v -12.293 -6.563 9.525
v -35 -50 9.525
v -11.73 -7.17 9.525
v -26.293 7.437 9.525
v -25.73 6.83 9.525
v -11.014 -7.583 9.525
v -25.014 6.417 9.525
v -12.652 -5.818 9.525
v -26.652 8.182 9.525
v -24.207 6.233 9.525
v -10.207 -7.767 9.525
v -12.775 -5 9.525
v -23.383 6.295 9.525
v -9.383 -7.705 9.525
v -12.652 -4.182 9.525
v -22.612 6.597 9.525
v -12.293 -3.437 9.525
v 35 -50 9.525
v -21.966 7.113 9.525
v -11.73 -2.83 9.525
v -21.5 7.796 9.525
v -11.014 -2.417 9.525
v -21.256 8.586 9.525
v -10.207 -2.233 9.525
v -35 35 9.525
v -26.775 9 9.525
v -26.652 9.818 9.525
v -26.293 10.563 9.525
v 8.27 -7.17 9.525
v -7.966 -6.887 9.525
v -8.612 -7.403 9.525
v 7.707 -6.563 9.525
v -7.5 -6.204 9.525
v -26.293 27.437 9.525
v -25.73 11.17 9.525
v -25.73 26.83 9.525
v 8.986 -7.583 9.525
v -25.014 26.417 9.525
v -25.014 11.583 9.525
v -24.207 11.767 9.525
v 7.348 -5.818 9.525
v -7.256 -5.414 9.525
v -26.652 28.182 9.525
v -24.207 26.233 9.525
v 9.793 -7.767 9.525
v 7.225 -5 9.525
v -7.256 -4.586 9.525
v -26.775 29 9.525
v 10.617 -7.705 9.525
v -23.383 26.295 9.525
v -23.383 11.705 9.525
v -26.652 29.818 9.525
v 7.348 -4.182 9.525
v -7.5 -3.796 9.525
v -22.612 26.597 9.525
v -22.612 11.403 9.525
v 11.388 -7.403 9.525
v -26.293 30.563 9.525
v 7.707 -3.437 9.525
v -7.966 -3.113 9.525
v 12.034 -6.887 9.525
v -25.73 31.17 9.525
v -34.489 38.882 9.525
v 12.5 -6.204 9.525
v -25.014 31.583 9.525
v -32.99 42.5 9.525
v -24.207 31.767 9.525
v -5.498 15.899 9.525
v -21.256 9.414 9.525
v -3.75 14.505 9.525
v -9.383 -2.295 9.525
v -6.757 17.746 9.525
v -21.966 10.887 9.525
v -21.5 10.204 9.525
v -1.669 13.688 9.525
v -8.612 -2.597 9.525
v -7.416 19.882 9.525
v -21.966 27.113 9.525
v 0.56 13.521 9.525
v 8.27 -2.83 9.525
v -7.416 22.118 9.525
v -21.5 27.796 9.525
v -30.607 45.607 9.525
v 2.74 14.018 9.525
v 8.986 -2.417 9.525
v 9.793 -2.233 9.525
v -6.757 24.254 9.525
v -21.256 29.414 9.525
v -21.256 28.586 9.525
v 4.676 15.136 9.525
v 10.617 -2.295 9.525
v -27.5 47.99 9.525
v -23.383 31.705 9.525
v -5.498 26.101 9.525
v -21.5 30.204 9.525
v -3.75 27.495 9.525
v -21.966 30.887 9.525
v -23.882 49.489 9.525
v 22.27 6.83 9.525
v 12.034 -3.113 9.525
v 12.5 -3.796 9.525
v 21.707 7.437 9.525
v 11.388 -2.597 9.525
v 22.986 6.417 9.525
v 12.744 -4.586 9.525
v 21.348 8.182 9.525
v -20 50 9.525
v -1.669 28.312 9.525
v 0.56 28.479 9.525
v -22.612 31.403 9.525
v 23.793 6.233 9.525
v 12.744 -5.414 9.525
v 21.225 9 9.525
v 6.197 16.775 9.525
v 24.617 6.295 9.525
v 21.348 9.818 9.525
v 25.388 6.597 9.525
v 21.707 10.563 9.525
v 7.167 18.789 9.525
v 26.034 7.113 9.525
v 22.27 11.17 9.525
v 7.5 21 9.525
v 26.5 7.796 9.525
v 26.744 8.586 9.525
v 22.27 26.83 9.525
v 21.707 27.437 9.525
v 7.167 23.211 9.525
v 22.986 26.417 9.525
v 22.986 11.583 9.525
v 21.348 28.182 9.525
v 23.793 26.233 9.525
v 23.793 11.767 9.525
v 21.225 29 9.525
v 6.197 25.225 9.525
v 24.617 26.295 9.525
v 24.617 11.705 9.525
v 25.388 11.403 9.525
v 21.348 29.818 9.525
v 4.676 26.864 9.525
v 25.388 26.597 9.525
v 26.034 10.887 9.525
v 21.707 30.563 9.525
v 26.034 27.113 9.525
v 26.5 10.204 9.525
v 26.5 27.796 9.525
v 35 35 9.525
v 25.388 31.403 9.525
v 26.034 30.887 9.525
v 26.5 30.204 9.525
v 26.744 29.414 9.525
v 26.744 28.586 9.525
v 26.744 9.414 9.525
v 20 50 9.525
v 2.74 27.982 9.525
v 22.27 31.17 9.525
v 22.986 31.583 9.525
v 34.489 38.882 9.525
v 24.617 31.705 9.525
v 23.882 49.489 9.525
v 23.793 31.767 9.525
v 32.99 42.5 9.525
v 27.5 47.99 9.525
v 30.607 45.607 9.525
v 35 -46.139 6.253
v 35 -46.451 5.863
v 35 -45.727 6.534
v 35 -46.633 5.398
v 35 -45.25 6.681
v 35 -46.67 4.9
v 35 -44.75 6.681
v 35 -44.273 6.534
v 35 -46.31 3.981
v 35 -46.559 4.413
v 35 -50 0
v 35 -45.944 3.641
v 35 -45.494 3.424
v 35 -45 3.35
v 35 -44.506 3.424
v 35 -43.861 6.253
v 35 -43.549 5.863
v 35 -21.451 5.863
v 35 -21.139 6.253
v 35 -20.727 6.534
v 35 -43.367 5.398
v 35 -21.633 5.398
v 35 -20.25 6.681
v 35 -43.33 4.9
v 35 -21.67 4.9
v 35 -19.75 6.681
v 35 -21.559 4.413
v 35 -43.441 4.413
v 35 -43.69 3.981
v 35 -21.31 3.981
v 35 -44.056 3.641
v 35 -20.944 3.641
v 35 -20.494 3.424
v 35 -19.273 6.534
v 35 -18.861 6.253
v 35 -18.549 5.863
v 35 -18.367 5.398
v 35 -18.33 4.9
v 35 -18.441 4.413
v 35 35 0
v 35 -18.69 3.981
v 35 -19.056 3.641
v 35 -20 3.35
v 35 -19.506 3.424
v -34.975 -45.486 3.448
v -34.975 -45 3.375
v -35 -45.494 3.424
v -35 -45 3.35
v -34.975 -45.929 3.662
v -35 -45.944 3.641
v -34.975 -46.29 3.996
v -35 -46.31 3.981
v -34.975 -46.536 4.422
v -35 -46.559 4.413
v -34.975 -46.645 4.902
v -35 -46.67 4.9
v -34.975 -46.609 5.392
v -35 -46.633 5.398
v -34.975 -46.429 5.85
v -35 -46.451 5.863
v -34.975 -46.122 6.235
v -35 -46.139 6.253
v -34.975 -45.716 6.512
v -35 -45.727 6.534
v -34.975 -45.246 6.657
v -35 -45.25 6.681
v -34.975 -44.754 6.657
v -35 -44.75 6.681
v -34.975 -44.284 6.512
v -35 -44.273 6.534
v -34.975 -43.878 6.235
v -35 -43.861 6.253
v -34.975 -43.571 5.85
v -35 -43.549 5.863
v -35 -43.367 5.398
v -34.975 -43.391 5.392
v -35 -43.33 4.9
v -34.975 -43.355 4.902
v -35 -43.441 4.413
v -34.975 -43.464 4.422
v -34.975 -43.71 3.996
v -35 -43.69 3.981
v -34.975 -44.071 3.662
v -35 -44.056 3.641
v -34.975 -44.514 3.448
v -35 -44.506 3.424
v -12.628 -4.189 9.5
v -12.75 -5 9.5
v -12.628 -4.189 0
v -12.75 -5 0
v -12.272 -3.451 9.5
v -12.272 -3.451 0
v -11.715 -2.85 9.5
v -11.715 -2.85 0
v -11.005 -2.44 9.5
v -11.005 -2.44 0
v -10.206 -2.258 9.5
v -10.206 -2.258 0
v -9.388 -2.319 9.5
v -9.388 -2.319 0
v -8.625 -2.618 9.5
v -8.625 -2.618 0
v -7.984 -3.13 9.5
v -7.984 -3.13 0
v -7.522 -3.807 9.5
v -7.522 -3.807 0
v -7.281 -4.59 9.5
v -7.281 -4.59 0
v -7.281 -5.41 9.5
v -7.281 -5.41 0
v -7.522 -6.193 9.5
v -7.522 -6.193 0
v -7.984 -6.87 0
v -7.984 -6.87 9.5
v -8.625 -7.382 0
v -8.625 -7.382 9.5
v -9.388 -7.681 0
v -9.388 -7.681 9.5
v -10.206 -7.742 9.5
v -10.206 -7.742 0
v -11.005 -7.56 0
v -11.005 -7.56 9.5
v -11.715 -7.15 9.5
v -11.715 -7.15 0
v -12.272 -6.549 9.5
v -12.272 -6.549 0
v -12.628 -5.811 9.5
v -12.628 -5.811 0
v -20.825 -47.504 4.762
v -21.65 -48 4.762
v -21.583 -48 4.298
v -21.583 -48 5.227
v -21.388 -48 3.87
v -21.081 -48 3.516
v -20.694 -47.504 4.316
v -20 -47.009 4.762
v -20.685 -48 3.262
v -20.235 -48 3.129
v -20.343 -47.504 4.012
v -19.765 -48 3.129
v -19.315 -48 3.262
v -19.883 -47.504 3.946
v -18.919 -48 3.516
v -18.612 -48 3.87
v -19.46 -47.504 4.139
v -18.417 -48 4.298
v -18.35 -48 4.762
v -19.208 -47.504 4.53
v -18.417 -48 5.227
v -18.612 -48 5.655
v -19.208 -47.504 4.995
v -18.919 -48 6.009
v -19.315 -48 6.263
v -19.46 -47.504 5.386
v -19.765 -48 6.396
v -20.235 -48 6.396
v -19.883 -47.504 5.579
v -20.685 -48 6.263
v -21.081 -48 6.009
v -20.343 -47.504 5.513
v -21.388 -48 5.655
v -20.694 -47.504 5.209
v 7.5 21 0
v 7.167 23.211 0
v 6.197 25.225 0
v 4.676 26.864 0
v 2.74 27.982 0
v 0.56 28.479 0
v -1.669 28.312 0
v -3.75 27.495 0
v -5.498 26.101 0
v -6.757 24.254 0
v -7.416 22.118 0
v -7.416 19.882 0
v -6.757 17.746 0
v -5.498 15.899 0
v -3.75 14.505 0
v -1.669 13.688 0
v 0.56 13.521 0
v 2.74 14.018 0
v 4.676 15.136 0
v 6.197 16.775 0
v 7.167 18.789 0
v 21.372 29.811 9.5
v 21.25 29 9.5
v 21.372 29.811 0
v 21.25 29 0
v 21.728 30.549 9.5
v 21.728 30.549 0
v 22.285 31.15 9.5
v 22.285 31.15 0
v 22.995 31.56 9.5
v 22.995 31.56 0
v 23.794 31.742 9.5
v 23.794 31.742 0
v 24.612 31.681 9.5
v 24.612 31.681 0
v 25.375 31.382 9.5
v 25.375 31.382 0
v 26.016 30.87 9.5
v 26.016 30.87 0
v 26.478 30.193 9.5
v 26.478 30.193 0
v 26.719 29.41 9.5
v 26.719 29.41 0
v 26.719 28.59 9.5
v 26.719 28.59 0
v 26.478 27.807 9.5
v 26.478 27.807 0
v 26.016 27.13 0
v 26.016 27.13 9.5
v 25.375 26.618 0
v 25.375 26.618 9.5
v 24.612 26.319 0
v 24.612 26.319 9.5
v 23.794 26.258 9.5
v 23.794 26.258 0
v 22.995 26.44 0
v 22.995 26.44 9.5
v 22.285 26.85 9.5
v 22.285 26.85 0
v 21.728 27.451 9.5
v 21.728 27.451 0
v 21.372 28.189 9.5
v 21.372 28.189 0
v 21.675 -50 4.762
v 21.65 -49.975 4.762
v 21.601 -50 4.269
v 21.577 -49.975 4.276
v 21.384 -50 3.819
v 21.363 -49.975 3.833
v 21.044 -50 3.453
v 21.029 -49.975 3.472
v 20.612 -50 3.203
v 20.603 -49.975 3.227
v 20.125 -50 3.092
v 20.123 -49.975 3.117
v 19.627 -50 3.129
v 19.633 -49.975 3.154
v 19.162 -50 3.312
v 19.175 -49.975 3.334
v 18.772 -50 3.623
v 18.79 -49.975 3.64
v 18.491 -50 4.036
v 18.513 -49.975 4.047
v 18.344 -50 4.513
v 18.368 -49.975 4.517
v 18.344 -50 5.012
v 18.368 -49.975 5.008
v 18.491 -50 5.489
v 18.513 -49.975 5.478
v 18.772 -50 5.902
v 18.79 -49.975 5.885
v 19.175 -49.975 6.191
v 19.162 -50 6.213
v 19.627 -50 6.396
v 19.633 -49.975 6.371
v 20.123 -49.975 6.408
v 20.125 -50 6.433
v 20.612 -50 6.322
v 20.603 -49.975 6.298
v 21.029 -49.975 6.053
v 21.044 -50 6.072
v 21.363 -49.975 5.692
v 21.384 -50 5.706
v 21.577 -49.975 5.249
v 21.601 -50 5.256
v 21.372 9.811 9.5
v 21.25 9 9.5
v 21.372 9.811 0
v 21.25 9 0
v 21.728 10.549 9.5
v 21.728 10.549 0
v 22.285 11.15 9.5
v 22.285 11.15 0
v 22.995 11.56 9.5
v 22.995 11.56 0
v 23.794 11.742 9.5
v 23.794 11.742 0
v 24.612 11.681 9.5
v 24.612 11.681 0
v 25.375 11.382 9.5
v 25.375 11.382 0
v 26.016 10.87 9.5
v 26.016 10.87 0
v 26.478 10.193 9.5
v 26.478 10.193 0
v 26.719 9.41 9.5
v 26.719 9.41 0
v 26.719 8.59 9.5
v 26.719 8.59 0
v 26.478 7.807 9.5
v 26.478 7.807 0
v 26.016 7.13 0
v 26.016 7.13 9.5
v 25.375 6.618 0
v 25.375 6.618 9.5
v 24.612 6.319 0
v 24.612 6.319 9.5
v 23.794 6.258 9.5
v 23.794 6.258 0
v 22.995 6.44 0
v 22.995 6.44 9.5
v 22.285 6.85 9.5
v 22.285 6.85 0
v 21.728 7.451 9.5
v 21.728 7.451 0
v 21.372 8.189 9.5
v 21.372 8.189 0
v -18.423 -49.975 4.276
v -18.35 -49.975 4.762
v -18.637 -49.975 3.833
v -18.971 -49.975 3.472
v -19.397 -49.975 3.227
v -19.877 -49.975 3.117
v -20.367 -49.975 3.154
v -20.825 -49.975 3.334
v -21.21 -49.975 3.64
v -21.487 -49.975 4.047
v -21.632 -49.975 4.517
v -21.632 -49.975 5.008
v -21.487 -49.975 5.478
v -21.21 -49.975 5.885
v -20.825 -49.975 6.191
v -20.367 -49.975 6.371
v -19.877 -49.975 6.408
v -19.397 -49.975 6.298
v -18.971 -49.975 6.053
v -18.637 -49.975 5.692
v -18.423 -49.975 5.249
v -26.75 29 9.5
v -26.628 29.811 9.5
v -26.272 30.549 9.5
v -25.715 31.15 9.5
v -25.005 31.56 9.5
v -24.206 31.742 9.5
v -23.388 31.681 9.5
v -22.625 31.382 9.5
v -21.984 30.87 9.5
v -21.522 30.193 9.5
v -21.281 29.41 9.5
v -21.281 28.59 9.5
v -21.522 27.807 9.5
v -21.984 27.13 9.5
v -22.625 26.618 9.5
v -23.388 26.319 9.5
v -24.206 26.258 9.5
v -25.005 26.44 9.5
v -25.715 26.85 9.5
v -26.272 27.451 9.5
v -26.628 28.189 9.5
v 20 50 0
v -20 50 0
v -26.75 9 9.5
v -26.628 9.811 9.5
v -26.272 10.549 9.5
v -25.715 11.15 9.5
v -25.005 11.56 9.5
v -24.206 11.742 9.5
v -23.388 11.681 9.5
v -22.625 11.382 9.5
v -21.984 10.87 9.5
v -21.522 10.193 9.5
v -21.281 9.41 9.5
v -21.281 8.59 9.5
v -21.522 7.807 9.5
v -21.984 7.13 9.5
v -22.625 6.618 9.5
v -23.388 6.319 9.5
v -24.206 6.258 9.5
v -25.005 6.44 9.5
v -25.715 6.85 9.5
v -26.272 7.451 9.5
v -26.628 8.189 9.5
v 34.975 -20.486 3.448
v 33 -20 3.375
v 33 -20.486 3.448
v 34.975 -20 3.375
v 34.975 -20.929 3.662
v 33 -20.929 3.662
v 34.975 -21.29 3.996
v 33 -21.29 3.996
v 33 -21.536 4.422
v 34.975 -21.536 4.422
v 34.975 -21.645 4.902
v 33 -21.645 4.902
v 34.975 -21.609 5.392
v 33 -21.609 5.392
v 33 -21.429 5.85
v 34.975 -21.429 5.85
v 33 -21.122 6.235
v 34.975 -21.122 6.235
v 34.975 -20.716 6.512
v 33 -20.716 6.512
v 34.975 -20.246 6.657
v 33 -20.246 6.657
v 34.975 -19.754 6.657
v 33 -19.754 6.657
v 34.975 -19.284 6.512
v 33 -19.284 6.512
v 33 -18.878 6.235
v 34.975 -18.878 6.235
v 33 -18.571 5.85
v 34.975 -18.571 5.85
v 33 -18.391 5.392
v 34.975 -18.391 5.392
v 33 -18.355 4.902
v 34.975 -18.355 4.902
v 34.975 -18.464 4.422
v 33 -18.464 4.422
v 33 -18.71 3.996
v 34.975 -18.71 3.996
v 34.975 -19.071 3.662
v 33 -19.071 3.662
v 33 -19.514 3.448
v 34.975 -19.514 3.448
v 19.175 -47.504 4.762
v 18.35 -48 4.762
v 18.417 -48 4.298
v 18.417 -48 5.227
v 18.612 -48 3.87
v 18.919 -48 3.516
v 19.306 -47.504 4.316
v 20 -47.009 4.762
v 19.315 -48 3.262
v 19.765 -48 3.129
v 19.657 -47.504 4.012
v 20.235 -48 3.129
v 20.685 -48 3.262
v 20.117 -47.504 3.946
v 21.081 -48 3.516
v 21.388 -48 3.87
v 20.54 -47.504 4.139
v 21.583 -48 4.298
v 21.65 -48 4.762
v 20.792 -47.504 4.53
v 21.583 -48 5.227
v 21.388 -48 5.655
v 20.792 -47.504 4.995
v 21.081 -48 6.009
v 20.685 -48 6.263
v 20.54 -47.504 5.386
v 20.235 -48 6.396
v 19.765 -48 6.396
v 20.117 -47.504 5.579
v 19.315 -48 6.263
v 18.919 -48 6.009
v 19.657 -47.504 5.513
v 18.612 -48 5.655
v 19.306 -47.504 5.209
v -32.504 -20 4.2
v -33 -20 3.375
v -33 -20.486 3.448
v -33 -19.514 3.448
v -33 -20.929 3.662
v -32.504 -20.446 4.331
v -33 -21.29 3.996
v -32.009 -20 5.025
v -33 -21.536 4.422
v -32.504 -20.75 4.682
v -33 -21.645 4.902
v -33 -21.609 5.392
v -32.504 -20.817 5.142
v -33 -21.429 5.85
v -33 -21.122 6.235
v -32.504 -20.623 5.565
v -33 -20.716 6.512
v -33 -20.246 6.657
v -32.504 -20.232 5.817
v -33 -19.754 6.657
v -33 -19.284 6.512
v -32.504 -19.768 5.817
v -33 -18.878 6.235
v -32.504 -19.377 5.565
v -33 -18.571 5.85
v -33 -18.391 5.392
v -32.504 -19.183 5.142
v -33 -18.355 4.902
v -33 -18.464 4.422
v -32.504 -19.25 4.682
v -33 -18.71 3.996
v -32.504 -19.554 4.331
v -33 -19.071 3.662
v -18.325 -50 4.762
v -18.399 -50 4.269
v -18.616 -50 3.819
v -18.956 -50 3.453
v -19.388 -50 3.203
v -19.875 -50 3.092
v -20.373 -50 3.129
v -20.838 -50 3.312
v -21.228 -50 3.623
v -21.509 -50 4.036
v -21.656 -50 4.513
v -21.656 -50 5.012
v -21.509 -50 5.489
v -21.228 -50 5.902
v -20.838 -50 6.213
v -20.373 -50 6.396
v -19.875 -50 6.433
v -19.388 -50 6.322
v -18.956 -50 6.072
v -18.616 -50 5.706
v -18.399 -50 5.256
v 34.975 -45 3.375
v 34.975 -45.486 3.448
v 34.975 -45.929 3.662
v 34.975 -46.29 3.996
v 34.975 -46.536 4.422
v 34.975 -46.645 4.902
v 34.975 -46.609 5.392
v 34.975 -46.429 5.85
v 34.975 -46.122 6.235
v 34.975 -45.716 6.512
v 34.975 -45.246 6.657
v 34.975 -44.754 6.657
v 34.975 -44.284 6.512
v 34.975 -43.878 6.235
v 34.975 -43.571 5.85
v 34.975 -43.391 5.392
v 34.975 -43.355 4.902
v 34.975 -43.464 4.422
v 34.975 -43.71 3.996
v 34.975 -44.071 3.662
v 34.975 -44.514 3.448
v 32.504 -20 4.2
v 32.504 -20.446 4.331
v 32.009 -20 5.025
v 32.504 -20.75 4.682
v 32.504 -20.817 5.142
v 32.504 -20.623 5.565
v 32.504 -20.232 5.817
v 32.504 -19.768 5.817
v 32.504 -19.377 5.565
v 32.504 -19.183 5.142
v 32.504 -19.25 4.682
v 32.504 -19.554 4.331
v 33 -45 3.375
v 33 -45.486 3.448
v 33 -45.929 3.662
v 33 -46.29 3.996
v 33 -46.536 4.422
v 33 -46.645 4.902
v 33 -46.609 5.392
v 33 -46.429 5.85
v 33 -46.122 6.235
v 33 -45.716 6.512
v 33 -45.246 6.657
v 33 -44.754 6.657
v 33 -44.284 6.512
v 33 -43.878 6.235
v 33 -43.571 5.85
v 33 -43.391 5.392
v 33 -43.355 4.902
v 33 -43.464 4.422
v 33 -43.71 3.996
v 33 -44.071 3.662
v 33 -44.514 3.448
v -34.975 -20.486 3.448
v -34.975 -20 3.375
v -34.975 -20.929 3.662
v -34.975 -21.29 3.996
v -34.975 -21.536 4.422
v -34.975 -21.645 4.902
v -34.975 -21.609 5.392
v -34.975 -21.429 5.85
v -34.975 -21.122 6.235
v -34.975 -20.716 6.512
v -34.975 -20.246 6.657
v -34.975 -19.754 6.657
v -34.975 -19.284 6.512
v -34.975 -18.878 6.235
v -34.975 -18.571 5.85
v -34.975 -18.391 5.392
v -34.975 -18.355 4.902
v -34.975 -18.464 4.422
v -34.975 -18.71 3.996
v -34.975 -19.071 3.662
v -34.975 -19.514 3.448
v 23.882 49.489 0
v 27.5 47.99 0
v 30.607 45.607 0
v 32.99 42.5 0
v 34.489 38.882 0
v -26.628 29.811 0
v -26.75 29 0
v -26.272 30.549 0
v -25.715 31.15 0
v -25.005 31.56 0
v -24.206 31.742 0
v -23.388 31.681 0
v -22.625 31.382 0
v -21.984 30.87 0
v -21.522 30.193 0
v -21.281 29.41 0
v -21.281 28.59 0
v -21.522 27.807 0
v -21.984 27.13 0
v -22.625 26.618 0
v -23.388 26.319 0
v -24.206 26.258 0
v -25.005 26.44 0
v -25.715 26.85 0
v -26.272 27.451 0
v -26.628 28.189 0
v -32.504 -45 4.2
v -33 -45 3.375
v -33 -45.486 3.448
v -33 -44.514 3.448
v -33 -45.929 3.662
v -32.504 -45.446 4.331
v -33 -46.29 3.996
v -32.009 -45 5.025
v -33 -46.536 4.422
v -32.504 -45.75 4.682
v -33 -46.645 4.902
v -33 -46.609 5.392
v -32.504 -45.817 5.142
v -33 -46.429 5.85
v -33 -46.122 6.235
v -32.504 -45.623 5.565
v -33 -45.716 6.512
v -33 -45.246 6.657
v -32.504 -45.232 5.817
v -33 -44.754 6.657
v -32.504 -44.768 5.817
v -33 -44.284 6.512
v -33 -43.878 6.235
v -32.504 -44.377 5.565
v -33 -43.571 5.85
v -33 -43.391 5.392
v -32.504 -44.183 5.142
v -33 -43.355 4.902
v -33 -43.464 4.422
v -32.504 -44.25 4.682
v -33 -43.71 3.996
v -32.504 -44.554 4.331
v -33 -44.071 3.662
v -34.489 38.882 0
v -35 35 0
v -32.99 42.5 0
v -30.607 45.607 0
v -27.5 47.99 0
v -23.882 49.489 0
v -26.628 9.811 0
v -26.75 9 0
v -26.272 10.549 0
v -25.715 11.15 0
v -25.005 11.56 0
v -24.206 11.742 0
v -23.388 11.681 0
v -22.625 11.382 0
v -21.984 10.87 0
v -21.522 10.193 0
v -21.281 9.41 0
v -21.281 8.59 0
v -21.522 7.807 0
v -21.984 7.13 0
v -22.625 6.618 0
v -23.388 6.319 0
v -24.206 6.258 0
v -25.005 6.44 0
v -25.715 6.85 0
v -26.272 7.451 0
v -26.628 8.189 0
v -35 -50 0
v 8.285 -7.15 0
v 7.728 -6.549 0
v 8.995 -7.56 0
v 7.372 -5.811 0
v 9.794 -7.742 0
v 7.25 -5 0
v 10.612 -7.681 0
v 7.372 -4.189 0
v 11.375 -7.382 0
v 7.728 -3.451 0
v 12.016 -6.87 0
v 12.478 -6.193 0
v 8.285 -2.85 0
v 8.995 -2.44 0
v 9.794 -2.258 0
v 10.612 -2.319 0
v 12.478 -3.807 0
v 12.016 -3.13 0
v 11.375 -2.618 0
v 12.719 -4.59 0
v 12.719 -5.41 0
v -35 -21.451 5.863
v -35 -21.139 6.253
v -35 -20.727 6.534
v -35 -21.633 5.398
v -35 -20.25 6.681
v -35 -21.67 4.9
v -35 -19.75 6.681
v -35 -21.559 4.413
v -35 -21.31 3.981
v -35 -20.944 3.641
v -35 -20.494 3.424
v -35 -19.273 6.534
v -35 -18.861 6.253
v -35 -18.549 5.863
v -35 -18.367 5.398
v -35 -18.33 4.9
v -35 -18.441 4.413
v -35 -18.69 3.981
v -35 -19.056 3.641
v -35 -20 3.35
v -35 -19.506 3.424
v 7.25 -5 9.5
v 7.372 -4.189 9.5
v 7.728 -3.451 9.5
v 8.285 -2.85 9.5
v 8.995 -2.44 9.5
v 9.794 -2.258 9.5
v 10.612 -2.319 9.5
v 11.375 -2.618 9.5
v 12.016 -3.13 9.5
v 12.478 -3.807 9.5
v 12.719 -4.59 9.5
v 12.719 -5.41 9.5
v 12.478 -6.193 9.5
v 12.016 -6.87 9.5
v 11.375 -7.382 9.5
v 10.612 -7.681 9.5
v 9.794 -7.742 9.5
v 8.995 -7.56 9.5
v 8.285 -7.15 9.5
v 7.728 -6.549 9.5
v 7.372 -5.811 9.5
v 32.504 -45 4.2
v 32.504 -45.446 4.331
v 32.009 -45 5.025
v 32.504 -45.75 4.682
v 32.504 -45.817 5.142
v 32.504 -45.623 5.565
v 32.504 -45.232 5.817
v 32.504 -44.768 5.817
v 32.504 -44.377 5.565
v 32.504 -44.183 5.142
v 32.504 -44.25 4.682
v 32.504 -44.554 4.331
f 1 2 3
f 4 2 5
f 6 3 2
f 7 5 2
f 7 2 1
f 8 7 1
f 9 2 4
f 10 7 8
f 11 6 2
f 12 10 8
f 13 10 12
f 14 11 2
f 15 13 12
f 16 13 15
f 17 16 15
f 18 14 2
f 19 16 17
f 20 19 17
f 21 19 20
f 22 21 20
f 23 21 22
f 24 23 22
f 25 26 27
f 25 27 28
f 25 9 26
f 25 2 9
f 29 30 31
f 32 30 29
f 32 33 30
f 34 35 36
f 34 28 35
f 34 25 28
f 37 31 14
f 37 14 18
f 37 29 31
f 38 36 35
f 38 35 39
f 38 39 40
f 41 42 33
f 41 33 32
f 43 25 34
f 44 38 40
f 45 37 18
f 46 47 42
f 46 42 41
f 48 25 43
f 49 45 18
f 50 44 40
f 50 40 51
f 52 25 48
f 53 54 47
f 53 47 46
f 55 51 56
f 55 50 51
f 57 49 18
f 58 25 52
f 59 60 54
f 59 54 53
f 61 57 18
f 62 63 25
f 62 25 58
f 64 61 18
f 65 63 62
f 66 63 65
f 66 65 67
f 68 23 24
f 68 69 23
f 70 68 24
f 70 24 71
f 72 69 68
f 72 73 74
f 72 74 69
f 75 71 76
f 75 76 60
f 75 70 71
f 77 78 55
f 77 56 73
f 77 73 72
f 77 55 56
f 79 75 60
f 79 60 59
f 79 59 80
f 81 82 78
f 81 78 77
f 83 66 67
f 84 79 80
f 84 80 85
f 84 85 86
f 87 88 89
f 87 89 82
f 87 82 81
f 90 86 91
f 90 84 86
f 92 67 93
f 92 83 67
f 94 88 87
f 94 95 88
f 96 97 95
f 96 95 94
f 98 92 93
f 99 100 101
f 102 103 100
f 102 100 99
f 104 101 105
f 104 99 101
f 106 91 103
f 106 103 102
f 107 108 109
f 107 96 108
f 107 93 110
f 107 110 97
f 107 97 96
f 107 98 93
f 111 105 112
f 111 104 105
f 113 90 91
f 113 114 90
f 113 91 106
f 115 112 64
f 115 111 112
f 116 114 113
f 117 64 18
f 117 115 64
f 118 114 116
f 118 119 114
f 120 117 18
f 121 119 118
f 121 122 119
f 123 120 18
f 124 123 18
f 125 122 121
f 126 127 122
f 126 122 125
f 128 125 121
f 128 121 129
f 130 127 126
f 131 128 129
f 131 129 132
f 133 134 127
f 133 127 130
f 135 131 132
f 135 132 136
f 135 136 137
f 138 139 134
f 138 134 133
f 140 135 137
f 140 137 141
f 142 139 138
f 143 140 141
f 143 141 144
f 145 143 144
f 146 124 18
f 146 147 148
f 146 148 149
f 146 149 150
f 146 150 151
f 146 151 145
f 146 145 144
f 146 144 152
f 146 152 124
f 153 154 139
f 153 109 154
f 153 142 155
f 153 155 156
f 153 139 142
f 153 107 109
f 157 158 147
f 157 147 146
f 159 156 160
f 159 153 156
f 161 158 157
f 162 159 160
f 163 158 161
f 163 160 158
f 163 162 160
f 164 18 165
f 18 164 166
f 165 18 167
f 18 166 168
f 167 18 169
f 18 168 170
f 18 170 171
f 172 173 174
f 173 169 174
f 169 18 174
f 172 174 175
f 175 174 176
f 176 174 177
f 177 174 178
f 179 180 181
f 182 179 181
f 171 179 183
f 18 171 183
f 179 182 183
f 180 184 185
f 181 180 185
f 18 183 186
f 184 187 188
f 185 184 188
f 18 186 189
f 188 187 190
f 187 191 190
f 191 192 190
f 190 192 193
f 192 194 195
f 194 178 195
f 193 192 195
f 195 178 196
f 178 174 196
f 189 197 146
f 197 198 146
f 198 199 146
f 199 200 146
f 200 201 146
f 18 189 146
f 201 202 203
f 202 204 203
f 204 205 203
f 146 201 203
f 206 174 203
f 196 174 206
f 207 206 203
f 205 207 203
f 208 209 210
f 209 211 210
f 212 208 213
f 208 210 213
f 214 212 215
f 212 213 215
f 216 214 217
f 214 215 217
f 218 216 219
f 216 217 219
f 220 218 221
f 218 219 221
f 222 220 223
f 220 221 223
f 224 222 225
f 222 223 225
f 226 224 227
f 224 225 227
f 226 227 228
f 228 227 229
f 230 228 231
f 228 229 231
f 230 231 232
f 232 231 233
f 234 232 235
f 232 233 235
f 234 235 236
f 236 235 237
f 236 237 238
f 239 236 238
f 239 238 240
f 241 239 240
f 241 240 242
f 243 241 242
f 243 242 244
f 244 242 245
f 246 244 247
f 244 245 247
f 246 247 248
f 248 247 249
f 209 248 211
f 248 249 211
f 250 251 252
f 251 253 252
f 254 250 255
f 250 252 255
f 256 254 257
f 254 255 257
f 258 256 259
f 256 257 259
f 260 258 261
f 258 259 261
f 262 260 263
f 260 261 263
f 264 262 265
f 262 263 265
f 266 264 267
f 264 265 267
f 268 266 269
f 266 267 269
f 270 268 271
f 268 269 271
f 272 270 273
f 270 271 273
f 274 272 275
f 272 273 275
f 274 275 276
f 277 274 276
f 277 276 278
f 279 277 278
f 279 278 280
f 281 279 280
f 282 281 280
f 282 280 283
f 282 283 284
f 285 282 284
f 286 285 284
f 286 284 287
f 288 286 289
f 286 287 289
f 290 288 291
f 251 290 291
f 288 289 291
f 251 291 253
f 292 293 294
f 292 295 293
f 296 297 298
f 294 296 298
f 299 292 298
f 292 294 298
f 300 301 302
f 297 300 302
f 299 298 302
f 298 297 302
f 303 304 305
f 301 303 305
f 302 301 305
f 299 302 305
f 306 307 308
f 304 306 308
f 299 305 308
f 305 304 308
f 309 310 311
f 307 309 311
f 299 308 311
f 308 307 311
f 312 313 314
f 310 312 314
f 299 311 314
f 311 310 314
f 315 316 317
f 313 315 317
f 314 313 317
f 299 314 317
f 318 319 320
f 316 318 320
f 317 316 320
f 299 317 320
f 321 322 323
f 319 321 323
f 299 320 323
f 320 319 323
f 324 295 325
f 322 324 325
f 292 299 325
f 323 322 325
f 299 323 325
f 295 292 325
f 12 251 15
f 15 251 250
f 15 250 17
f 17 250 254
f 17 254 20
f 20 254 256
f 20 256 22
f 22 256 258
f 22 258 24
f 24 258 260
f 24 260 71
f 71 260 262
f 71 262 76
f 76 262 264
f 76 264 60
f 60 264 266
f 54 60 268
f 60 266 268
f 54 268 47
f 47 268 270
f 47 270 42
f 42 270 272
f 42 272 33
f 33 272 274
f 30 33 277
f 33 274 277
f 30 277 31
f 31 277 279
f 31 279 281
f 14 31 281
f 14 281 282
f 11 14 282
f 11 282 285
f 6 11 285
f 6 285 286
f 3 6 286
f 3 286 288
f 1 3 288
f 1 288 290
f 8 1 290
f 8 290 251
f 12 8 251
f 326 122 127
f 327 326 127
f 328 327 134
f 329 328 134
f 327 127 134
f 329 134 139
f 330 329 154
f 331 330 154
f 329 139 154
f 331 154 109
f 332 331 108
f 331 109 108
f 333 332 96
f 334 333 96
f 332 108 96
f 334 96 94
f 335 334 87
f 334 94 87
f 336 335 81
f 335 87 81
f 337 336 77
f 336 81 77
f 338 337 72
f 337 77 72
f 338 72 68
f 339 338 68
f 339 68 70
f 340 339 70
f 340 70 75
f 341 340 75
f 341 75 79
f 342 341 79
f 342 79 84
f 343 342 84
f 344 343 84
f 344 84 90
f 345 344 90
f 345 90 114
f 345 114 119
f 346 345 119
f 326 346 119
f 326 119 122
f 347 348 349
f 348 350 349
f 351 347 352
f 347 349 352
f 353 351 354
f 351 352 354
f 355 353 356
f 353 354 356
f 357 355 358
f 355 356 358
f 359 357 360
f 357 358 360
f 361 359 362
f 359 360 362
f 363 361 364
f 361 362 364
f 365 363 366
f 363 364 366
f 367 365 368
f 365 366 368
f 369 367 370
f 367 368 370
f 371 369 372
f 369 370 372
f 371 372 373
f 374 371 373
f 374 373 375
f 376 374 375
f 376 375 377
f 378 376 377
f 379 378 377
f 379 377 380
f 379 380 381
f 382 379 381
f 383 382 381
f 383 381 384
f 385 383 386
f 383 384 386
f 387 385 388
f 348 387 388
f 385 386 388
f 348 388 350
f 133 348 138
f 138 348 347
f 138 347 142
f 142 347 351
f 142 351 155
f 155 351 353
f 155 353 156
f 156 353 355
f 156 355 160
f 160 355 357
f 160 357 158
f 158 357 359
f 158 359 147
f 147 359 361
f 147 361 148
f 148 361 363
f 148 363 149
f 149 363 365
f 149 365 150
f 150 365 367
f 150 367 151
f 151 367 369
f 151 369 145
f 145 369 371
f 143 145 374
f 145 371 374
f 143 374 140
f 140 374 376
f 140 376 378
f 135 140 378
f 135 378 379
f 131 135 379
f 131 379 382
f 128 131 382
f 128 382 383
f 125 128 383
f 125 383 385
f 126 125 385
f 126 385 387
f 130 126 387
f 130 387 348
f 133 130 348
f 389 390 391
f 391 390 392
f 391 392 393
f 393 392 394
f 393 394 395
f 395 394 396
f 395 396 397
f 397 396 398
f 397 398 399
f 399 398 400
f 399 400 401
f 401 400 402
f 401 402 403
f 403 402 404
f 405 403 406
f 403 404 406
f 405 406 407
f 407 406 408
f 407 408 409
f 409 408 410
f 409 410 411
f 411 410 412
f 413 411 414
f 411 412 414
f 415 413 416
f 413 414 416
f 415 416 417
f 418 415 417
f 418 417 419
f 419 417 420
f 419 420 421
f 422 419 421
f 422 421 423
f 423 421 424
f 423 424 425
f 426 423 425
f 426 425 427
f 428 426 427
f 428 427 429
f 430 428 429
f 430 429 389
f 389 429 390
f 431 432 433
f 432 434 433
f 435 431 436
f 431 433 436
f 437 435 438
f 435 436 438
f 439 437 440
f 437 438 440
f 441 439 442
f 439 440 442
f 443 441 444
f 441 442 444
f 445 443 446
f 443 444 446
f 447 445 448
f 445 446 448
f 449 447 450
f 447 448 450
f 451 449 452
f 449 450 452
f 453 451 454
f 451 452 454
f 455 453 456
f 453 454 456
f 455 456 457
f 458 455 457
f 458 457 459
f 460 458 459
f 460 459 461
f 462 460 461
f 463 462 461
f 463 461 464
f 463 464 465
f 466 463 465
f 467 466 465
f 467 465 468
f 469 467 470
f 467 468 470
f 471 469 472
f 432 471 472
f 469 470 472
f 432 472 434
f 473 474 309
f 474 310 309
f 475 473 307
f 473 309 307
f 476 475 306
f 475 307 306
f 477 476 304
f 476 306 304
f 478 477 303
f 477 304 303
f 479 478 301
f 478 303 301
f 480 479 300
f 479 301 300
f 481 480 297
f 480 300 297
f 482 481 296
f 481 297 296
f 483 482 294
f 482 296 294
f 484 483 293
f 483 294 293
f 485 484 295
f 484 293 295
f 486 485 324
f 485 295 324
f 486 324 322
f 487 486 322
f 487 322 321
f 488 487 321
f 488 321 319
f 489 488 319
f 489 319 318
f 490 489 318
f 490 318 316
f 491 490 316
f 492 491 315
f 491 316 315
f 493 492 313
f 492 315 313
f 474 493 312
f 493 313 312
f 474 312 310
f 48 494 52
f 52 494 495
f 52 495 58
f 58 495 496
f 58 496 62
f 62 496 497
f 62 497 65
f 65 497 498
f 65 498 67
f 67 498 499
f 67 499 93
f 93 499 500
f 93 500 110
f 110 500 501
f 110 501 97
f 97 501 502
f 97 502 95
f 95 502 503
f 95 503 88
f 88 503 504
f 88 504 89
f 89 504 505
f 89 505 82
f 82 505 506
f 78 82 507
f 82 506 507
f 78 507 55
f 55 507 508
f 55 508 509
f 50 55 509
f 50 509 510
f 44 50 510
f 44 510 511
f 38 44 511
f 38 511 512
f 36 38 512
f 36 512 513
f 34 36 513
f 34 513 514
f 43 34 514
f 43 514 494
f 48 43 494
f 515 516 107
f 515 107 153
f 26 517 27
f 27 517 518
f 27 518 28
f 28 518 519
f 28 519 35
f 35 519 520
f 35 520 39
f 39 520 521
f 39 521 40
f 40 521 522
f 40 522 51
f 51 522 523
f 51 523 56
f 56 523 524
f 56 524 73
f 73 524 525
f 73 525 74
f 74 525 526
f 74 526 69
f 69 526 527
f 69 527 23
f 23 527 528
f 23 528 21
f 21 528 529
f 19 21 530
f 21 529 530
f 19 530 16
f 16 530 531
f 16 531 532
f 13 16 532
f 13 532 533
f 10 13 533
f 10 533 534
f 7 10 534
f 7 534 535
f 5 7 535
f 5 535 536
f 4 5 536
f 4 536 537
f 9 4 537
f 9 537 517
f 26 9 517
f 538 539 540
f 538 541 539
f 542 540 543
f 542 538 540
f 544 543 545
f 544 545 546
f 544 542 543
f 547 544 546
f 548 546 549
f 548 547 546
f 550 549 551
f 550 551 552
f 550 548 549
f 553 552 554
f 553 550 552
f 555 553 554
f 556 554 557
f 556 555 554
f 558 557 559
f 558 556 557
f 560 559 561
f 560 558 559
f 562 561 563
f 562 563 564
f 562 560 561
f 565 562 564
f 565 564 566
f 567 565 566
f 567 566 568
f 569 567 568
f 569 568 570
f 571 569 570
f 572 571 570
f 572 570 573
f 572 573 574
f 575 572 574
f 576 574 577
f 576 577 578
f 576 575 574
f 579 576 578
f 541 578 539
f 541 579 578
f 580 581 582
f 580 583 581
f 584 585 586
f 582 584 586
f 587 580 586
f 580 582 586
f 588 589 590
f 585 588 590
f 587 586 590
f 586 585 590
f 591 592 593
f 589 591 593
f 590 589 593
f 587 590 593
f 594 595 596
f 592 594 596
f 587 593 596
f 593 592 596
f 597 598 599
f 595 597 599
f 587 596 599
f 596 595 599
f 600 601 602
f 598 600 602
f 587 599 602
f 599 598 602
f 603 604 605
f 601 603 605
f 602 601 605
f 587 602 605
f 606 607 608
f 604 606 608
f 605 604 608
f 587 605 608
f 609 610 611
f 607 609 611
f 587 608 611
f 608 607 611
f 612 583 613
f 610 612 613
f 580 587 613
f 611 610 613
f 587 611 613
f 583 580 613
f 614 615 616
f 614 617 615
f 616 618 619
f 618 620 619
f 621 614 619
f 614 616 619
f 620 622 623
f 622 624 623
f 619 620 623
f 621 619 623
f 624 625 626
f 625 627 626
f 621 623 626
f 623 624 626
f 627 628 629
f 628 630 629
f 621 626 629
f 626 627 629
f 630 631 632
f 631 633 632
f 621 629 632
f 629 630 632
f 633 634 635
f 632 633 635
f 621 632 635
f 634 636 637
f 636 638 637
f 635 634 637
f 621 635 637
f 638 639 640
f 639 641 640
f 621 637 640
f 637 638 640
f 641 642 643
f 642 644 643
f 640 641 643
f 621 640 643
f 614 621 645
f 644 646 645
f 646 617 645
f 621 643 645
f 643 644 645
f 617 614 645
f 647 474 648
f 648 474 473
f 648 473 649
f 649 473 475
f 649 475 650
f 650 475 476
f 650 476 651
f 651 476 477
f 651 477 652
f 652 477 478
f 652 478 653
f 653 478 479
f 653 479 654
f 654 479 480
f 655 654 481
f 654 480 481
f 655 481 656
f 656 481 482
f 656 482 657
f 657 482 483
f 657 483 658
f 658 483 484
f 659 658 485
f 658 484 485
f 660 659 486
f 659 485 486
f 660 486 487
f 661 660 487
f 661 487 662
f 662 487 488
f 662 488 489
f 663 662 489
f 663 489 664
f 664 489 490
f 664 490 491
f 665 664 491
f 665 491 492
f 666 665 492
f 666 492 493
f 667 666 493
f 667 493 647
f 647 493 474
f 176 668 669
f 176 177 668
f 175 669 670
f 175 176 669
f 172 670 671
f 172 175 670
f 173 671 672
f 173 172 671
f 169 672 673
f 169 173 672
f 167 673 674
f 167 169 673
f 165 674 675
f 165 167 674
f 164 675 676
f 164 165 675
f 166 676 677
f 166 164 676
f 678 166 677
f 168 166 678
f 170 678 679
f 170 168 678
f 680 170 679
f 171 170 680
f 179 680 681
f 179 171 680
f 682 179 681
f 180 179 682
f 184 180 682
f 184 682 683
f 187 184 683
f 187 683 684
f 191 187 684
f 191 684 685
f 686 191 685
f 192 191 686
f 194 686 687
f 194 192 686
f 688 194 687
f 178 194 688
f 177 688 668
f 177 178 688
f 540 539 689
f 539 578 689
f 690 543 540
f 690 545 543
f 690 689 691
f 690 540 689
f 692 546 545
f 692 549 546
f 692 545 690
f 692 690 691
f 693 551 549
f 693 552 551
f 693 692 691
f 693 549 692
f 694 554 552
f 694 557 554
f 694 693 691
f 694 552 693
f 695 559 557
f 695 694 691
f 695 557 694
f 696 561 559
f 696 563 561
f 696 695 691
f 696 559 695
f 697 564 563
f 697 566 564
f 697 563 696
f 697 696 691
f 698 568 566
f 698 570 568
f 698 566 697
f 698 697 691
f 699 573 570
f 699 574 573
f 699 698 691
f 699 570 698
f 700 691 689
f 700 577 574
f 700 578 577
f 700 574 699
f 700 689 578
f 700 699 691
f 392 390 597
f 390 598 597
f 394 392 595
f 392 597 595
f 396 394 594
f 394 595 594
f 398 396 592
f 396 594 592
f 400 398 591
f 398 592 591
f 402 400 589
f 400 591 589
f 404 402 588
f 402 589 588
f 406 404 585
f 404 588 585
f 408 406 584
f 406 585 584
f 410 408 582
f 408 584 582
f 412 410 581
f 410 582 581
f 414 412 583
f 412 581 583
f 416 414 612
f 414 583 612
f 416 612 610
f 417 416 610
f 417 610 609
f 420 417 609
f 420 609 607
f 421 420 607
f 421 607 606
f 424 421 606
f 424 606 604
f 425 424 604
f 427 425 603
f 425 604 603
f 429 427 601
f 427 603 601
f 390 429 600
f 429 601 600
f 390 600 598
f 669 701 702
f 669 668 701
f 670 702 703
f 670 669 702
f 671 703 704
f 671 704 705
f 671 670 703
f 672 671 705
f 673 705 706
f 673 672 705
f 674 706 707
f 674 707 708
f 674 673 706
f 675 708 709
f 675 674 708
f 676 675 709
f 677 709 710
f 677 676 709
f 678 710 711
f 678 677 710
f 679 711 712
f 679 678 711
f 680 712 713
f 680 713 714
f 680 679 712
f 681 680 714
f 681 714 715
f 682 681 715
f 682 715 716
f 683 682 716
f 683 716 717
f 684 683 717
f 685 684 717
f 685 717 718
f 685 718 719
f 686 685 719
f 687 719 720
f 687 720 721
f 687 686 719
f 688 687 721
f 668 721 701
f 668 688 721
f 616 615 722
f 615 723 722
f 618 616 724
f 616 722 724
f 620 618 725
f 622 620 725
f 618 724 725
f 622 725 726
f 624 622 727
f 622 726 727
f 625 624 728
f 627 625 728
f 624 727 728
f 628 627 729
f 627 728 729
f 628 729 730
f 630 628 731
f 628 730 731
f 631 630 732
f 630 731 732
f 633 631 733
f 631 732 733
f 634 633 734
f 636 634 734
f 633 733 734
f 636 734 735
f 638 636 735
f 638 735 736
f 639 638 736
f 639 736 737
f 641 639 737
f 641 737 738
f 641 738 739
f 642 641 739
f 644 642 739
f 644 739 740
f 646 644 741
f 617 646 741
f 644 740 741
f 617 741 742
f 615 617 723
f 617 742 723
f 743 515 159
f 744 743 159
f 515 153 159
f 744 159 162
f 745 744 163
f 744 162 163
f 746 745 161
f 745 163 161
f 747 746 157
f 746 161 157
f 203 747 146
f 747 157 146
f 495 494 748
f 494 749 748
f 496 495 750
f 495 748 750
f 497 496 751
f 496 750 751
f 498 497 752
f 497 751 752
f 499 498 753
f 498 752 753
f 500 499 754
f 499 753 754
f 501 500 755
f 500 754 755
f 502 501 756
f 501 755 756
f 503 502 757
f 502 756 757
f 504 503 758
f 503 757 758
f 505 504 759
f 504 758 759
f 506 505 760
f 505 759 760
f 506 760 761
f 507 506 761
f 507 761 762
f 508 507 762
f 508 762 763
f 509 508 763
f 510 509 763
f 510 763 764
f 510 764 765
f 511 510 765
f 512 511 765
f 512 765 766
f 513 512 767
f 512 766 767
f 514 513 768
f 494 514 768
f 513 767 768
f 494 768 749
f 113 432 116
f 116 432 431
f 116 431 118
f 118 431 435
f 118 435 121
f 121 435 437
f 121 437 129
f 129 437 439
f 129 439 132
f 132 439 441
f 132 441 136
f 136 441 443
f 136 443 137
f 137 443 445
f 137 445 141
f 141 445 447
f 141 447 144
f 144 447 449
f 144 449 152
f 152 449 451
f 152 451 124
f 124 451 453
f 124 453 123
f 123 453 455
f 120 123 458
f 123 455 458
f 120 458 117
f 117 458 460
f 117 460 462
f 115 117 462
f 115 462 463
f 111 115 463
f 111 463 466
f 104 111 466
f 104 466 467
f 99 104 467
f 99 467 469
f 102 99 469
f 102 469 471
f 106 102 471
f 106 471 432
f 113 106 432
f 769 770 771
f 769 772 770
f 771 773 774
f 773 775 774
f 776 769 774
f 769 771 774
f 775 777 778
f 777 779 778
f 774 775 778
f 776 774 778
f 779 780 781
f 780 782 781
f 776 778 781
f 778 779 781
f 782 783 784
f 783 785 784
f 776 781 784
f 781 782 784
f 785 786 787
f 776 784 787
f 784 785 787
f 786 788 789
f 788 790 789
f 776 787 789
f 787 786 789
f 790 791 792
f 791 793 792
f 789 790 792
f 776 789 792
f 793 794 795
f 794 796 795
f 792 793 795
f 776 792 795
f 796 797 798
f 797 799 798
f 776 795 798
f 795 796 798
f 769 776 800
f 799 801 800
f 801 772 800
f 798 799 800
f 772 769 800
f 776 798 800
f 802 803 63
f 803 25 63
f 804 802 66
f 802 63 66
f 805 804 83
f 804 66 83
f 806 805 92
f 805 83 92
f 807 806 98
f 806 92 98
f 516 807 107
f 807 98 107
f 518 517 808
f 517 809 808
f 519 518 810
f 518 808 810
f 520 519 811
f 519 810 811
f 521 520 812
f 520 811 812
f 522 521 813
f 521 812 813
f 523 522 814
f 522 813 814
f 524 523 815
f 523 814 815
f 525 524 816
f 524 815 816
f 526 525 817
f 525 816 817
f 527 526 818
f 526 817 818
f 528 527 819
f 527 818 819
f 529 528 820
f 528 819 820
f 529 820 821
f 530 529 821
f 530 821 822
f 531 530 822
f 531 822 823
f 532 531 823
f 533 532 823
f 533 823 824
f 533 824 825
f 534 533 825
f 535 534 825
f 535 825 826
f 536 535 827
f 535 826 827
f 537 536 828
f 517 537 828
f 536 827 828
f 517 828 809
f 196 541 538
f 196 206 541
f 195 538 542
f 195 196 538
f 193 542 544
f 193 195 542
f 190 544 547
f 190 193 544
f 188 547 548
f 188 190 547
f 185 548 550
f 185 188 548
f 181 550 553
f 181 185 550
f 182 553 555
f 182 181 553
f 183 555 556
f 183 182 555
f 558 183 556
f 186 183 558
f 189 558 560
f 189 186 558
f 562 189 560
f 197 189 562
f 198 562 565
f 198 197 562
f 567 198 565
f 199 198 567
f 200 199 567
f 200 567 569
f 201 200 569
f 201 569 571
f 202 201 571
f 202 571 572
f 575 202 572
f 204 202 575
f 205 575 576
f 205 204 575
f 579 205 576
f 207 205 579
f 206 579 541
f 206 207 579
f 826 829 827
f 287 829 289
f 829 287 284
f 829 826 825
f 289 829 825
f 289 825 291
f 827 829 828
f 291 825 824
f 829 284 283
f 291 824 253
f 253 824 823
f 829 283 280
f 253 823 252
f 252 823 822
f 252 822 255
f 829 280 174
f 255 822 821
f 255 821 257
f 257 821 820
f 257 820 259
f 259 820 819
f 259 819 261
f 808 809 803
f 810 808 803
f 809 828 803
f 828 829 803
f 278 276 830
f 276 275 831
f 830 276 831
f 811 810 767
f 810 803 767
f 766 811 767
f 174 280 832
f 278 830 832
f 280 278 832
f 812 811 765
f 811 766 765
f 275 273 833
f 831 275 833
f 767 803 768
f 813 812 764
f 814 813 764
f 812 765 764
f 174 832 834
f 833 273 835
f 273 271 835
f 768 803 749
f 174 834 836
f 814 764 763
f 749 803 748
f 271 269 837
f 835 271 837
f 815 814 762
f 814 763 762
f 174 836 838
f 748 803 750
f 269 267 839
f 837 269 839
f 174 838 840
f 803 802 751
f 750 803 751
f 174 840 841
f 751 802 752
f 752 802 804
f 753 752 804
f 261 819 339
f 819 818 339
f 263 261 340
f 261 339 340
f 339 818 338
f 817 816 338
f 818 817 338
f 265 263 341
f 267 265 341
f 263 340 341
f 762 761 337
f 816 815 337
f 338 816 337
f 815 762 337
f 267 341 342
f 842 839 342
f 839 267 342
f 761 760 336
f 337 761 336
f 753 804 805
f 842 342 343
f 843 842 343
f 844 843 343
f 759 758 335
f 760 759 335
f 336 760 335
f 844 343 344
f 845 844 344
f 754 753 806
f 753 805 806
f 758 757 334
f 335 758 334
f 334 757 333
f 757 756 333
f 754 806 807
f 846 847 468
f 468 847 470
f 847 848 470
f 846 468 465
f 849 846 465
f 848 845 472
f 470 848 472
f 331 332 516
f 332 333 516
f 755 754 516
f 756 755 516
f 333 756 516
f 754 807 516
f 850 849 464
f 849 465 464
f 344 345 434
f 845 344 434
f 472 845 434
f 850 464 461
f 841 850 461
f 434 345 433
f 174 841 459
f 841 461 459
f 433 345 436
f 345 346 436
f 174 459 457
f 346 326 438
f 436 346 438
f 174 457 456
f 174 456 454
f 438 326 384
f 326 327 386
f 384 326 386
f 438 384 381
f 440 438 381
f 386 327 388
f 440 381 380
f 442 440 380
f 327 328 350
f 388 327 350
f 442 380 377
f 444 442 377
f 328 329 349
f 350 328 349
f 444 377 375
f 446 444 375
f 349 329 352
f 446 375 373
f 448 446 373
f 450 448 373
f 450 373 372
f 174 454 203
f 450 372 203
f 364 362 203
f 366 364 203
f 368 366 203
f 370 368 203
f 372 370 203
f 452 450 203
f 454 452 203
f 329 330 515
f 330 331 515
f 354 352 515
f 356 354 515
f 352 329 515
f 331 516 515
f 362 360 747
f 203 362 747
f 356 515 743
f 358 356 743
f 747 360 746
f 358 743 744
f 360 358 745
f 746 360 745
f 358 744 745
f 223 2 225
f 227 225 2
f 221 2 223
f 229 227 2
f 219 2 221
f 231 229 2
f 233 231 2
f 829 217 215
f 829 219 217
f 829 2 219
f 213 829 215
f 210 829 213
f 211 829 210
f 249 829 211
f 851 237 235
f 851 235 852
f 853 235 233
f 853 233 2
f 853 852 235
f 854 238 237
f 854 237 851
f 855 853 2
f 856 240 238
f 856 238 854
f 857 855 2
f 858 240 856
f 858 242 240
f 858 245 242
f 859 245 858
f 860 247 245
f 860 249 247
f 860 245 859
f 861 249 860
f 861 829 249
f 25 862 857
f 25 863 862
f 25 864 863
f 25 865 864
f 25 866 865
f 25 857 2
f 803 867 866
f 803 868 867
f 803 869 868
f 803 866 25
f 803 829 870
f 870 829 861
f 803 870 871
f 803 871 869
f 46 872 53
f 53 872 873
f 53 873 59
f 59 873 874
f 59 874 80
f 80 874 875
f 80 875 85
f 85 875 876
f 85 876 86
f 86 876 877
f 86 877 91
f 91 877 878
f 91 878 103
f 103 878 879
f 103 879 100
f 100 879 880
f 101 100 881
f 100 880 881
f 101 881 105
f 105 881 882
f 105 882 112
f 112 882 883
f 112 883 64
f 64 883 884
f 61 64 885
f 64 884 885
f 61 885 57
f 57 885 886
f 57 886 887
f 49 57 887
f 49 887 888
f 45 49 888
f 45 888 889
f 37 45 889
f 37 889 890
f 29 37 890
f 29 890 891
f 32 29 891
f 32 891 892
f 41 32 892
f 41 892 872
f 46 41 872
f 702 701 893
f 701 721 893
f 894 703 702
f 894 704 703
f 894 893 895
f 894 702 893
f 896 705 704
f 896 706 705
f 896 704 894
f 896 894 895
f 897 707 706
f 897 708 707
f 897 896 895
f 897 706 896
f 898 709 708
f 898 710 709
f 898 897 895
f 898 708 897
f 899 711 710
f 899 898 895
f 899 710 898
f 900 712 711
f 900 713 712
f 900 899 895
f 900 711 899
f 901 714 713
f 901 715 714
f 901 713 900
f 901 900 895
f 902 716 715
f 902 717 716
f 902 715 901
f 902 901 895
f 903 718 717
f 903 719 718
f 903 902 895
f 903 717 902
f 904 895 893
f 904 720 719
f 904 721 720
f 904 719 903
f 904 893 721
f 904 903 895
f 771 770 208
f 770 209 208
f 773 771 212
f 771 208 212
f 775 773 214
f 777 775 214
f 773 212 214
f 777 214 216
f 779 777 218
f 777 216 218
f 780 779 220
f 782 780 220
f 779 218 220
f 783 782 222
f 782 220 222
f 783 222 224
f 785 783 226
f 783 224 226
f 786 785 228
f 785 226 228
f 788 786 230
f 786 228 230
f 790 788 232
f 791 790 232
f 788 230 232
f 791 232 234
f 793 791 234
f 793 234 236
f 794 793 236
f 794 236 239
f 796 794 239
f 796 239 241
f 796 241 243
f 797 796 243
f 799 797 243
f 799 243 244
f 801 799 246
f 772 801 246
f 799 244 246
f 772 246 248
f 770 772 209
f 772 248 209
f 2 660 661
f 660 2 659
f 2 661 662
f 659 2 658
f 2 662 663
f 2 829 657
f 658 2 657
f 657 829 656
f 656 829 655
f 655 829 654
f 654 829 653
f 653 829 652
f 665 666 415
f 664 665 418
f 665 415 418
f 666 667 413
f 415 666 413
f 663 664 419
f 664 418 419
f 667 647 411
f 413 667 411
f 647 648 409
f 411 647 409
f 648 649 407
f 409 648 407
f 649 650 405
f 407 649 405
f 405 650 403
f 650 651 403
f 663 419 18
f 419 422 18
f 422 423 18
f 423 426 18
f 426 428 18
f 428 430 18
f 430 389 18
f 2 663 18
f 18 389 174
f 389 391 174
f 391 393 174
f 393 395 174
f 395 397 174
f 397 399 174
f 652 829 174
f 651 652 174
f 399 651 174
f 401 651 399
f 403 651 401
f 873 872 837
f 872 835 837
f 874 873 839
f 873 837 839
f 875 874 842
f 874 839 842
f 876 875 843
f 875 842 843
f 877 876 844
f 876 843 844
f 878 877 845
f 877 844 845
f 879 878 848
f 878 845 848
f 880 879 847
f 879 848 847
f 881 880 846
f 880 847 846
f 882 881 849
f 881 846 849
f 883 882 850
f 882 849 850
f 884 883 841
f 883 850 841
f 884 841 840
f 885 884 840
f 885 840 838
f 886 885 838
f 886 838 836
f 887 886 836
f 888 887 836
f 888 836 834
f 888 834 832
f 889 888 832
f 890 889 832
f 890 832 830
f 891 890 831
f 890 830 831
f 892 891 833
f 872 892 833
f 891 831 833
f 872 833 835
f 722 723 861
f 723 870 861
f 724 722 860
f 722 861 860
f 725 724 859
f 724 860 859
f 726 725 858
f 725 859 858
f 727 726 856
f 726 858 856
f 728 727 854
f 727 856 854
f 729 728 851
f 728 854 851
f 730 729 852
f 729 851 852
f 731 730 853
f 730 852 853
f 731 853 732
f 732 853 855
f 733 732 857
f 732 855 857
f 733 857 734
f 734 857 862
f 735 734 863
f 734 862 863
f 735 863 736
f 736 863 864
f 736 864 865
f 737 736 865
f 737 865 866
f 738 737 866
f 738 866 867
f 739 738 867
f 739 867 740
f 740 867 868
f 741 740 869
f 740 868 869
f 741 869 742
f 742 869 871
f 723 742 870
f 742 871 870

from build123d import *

# Parameters (mm, degrees)
SKETCH1_W                             = 70
SKETCH1_H                             = 100
BOSS_EXTRUDE1_DEPTH                   = 9.525
TAP_DRILL_FOR_M4X0_7_TAP1_D           = 3.3
TAP_DRILL_FOR_M4X0_7_TAP1_DEPTH       = 2
TAP_DRILL_FOR_M4X0_7_TAP1_CSINK_D     = 3.35
TAP_DRILL_FOR_M4X0_7_TAP1_CSINK_ANGLE = 90
TAP_DRILL_FOR_M4X0_7_TAP1_TIP         = 0.991420021
SKETCH6_R                             = 7.5
CUT_EXTRUDE1_DEPTH                    = 62.771560001
M5_CLEARANCE_HOLE1_D                  = 5.5
M5_CLEARANCE_HOLE1_CSINK_D            = 5.55
M5_CLEARANCE_HOLE1_CSINK_ANGLE        = 90
TAP_DRILL_FOR_M4X0_7_TAP2_AT_2_COUNT  = 2
TAP_DRILL_FOR_M4X0_7_TAP2_AT_2_PITCH  = 25
FILLET1_R                             = 15


with BuildPart() as part:
    # Sketch1 → Boss-Extrude1 (new body)
    with BuildSketch(Plane.XY):
        Rectangle(SKETCH1_W, SKETCH1_H)
    extrude(amount=BOSS_EXTRUDE1_DEPTH)

    # Tap Drill for M4x0.7 Tap1
    with Locations(Plane(origin=(0, -50, 0), x_dir=(-1, 0, 0), z_dir=(0, -1, 0))):
        with Locations((20, -4.7625), (-20, -4.7625)):
            CounterSinkHole(TAP_DRILL_FOR_M4X0_7_TAP1_D / 2, TAP_DRILL_FOR_M4X0_7_TAP1_CSINK_D / 2, depth=TAP_DRILL_FOR_M4X0_7_TAP1_DEPTH, counter_sink_angle=TAP_DRILL_FOR_M4X0_7_TAP1_CSINK_ANGLE)
            with Locations((0, 0, -(TAP_DRILL_FOR_M4X0_7_TAP1_DEPTH + TAP_DRILL_FOR_M4X0_7_TAP1_TIP / 2))):  # 118° drill point
                Cone(0, TAP_DRILL_FOR_M4X0_7_TAP1_D / 2, TAP_DRILL_FOR_M4X0_7_TAP1_TIP, mode=Mode.SUBTRACT)

    # Sketch6 → Cut-Extrude1 (cut, through all)
    with BuildSketch(Plane.XY.offset(9.525)):
        with Locations((0, 21)):
            Circle(SKETCH6_R)
    extrude(amount=-CUT_EXTRUDE1_DEPTH, mode=Mode.SUBTRACT)

    # M5 Clearance Hole1 (through all)
    with Locations(Plane.XY.offset(9.525)):
        with Locations((-10, -5), (10, -5), (24, 9), (24, 29), (-24, 9), (-24, 29)):
            CounterSinkHole(M5_CLEARANCE_HOLE1_D / 2, M5_CLEARANCE_HOLE1_CSINK_D / 2, counter_sink_angle=M5_CLEARANCE_HOLE1_CSINK_ANGLE)

    # Sketch16 → Tap Drill for M4x0.7 Tap2 (revolve, cut)
    with BuildSketch(Plane(origin=(35, -45, 5.025), x_dir=(0, 0, -1), z_dir=(0, 1, 0))):
        Polygon((0, 0), (0, 2.991420021), (1.65, 2), (1.65, 0.025), (1.675, 0), align=None)
    tap_drill_for_m4x0_7_tap2 = revolve(axis=Axis((41.35, -45, 5.025), (-1, 0, 0)), mode=Mode.SUBTRACT)

    # Tap Drill for M4x0.7 Tap2 at 2: Tap Drill for M4x0.7 Tap2 ×2
    with Locations(*[(0, i * TAP_DRILL_FOR_M4X0_7_TAP2_AT_2_PITCH, 0) for i in range(1, TAP_DRILL_FOR_M4X0_7_TAP2_AT_2_COUNT)]):
        add(tap_drill_for_m4x0_7_tap2, mode=Mode.SUBTRACT)

    # Mirror1: Tap Drill for M4x0.7 Tap2 across plane
    add(tap_drill_for_m4x0_7_tap2.mirror(Plane(origin=(0, 0, 0), x_dir=(0, 0, 1), z_dir=(1, 0, 0))), mode=Mode.SUBTRACT)

    # Mirror1 copy 1 sketch → Mirror1 copy 1 (revolve, cut)
    with BuildSketch(Plane(origin=(-35, -20, 5.025), x_dir=(0, 0, -1), z_dir=(0, 1, 0))):
        Polygon((0, 0), (0, -2.991420021), (1.65, -2), (1.65, -0.025), (1.675, 0), align=None)
    revolve(axis=Axis((-41.35, -20, 5.025), (-1, 0, 0)), mode=Mode.SUBTRACT)

    # Fillet1
    fillet1_edges = [part.edges().sort_by_distance(p)[0] for p in [
        (-35, 50, 4.7625),
        (35, 50, 4.7625),
    ]]
    fillet(fillet1_edges, radius=FILLET1_R)


solid = part.part
